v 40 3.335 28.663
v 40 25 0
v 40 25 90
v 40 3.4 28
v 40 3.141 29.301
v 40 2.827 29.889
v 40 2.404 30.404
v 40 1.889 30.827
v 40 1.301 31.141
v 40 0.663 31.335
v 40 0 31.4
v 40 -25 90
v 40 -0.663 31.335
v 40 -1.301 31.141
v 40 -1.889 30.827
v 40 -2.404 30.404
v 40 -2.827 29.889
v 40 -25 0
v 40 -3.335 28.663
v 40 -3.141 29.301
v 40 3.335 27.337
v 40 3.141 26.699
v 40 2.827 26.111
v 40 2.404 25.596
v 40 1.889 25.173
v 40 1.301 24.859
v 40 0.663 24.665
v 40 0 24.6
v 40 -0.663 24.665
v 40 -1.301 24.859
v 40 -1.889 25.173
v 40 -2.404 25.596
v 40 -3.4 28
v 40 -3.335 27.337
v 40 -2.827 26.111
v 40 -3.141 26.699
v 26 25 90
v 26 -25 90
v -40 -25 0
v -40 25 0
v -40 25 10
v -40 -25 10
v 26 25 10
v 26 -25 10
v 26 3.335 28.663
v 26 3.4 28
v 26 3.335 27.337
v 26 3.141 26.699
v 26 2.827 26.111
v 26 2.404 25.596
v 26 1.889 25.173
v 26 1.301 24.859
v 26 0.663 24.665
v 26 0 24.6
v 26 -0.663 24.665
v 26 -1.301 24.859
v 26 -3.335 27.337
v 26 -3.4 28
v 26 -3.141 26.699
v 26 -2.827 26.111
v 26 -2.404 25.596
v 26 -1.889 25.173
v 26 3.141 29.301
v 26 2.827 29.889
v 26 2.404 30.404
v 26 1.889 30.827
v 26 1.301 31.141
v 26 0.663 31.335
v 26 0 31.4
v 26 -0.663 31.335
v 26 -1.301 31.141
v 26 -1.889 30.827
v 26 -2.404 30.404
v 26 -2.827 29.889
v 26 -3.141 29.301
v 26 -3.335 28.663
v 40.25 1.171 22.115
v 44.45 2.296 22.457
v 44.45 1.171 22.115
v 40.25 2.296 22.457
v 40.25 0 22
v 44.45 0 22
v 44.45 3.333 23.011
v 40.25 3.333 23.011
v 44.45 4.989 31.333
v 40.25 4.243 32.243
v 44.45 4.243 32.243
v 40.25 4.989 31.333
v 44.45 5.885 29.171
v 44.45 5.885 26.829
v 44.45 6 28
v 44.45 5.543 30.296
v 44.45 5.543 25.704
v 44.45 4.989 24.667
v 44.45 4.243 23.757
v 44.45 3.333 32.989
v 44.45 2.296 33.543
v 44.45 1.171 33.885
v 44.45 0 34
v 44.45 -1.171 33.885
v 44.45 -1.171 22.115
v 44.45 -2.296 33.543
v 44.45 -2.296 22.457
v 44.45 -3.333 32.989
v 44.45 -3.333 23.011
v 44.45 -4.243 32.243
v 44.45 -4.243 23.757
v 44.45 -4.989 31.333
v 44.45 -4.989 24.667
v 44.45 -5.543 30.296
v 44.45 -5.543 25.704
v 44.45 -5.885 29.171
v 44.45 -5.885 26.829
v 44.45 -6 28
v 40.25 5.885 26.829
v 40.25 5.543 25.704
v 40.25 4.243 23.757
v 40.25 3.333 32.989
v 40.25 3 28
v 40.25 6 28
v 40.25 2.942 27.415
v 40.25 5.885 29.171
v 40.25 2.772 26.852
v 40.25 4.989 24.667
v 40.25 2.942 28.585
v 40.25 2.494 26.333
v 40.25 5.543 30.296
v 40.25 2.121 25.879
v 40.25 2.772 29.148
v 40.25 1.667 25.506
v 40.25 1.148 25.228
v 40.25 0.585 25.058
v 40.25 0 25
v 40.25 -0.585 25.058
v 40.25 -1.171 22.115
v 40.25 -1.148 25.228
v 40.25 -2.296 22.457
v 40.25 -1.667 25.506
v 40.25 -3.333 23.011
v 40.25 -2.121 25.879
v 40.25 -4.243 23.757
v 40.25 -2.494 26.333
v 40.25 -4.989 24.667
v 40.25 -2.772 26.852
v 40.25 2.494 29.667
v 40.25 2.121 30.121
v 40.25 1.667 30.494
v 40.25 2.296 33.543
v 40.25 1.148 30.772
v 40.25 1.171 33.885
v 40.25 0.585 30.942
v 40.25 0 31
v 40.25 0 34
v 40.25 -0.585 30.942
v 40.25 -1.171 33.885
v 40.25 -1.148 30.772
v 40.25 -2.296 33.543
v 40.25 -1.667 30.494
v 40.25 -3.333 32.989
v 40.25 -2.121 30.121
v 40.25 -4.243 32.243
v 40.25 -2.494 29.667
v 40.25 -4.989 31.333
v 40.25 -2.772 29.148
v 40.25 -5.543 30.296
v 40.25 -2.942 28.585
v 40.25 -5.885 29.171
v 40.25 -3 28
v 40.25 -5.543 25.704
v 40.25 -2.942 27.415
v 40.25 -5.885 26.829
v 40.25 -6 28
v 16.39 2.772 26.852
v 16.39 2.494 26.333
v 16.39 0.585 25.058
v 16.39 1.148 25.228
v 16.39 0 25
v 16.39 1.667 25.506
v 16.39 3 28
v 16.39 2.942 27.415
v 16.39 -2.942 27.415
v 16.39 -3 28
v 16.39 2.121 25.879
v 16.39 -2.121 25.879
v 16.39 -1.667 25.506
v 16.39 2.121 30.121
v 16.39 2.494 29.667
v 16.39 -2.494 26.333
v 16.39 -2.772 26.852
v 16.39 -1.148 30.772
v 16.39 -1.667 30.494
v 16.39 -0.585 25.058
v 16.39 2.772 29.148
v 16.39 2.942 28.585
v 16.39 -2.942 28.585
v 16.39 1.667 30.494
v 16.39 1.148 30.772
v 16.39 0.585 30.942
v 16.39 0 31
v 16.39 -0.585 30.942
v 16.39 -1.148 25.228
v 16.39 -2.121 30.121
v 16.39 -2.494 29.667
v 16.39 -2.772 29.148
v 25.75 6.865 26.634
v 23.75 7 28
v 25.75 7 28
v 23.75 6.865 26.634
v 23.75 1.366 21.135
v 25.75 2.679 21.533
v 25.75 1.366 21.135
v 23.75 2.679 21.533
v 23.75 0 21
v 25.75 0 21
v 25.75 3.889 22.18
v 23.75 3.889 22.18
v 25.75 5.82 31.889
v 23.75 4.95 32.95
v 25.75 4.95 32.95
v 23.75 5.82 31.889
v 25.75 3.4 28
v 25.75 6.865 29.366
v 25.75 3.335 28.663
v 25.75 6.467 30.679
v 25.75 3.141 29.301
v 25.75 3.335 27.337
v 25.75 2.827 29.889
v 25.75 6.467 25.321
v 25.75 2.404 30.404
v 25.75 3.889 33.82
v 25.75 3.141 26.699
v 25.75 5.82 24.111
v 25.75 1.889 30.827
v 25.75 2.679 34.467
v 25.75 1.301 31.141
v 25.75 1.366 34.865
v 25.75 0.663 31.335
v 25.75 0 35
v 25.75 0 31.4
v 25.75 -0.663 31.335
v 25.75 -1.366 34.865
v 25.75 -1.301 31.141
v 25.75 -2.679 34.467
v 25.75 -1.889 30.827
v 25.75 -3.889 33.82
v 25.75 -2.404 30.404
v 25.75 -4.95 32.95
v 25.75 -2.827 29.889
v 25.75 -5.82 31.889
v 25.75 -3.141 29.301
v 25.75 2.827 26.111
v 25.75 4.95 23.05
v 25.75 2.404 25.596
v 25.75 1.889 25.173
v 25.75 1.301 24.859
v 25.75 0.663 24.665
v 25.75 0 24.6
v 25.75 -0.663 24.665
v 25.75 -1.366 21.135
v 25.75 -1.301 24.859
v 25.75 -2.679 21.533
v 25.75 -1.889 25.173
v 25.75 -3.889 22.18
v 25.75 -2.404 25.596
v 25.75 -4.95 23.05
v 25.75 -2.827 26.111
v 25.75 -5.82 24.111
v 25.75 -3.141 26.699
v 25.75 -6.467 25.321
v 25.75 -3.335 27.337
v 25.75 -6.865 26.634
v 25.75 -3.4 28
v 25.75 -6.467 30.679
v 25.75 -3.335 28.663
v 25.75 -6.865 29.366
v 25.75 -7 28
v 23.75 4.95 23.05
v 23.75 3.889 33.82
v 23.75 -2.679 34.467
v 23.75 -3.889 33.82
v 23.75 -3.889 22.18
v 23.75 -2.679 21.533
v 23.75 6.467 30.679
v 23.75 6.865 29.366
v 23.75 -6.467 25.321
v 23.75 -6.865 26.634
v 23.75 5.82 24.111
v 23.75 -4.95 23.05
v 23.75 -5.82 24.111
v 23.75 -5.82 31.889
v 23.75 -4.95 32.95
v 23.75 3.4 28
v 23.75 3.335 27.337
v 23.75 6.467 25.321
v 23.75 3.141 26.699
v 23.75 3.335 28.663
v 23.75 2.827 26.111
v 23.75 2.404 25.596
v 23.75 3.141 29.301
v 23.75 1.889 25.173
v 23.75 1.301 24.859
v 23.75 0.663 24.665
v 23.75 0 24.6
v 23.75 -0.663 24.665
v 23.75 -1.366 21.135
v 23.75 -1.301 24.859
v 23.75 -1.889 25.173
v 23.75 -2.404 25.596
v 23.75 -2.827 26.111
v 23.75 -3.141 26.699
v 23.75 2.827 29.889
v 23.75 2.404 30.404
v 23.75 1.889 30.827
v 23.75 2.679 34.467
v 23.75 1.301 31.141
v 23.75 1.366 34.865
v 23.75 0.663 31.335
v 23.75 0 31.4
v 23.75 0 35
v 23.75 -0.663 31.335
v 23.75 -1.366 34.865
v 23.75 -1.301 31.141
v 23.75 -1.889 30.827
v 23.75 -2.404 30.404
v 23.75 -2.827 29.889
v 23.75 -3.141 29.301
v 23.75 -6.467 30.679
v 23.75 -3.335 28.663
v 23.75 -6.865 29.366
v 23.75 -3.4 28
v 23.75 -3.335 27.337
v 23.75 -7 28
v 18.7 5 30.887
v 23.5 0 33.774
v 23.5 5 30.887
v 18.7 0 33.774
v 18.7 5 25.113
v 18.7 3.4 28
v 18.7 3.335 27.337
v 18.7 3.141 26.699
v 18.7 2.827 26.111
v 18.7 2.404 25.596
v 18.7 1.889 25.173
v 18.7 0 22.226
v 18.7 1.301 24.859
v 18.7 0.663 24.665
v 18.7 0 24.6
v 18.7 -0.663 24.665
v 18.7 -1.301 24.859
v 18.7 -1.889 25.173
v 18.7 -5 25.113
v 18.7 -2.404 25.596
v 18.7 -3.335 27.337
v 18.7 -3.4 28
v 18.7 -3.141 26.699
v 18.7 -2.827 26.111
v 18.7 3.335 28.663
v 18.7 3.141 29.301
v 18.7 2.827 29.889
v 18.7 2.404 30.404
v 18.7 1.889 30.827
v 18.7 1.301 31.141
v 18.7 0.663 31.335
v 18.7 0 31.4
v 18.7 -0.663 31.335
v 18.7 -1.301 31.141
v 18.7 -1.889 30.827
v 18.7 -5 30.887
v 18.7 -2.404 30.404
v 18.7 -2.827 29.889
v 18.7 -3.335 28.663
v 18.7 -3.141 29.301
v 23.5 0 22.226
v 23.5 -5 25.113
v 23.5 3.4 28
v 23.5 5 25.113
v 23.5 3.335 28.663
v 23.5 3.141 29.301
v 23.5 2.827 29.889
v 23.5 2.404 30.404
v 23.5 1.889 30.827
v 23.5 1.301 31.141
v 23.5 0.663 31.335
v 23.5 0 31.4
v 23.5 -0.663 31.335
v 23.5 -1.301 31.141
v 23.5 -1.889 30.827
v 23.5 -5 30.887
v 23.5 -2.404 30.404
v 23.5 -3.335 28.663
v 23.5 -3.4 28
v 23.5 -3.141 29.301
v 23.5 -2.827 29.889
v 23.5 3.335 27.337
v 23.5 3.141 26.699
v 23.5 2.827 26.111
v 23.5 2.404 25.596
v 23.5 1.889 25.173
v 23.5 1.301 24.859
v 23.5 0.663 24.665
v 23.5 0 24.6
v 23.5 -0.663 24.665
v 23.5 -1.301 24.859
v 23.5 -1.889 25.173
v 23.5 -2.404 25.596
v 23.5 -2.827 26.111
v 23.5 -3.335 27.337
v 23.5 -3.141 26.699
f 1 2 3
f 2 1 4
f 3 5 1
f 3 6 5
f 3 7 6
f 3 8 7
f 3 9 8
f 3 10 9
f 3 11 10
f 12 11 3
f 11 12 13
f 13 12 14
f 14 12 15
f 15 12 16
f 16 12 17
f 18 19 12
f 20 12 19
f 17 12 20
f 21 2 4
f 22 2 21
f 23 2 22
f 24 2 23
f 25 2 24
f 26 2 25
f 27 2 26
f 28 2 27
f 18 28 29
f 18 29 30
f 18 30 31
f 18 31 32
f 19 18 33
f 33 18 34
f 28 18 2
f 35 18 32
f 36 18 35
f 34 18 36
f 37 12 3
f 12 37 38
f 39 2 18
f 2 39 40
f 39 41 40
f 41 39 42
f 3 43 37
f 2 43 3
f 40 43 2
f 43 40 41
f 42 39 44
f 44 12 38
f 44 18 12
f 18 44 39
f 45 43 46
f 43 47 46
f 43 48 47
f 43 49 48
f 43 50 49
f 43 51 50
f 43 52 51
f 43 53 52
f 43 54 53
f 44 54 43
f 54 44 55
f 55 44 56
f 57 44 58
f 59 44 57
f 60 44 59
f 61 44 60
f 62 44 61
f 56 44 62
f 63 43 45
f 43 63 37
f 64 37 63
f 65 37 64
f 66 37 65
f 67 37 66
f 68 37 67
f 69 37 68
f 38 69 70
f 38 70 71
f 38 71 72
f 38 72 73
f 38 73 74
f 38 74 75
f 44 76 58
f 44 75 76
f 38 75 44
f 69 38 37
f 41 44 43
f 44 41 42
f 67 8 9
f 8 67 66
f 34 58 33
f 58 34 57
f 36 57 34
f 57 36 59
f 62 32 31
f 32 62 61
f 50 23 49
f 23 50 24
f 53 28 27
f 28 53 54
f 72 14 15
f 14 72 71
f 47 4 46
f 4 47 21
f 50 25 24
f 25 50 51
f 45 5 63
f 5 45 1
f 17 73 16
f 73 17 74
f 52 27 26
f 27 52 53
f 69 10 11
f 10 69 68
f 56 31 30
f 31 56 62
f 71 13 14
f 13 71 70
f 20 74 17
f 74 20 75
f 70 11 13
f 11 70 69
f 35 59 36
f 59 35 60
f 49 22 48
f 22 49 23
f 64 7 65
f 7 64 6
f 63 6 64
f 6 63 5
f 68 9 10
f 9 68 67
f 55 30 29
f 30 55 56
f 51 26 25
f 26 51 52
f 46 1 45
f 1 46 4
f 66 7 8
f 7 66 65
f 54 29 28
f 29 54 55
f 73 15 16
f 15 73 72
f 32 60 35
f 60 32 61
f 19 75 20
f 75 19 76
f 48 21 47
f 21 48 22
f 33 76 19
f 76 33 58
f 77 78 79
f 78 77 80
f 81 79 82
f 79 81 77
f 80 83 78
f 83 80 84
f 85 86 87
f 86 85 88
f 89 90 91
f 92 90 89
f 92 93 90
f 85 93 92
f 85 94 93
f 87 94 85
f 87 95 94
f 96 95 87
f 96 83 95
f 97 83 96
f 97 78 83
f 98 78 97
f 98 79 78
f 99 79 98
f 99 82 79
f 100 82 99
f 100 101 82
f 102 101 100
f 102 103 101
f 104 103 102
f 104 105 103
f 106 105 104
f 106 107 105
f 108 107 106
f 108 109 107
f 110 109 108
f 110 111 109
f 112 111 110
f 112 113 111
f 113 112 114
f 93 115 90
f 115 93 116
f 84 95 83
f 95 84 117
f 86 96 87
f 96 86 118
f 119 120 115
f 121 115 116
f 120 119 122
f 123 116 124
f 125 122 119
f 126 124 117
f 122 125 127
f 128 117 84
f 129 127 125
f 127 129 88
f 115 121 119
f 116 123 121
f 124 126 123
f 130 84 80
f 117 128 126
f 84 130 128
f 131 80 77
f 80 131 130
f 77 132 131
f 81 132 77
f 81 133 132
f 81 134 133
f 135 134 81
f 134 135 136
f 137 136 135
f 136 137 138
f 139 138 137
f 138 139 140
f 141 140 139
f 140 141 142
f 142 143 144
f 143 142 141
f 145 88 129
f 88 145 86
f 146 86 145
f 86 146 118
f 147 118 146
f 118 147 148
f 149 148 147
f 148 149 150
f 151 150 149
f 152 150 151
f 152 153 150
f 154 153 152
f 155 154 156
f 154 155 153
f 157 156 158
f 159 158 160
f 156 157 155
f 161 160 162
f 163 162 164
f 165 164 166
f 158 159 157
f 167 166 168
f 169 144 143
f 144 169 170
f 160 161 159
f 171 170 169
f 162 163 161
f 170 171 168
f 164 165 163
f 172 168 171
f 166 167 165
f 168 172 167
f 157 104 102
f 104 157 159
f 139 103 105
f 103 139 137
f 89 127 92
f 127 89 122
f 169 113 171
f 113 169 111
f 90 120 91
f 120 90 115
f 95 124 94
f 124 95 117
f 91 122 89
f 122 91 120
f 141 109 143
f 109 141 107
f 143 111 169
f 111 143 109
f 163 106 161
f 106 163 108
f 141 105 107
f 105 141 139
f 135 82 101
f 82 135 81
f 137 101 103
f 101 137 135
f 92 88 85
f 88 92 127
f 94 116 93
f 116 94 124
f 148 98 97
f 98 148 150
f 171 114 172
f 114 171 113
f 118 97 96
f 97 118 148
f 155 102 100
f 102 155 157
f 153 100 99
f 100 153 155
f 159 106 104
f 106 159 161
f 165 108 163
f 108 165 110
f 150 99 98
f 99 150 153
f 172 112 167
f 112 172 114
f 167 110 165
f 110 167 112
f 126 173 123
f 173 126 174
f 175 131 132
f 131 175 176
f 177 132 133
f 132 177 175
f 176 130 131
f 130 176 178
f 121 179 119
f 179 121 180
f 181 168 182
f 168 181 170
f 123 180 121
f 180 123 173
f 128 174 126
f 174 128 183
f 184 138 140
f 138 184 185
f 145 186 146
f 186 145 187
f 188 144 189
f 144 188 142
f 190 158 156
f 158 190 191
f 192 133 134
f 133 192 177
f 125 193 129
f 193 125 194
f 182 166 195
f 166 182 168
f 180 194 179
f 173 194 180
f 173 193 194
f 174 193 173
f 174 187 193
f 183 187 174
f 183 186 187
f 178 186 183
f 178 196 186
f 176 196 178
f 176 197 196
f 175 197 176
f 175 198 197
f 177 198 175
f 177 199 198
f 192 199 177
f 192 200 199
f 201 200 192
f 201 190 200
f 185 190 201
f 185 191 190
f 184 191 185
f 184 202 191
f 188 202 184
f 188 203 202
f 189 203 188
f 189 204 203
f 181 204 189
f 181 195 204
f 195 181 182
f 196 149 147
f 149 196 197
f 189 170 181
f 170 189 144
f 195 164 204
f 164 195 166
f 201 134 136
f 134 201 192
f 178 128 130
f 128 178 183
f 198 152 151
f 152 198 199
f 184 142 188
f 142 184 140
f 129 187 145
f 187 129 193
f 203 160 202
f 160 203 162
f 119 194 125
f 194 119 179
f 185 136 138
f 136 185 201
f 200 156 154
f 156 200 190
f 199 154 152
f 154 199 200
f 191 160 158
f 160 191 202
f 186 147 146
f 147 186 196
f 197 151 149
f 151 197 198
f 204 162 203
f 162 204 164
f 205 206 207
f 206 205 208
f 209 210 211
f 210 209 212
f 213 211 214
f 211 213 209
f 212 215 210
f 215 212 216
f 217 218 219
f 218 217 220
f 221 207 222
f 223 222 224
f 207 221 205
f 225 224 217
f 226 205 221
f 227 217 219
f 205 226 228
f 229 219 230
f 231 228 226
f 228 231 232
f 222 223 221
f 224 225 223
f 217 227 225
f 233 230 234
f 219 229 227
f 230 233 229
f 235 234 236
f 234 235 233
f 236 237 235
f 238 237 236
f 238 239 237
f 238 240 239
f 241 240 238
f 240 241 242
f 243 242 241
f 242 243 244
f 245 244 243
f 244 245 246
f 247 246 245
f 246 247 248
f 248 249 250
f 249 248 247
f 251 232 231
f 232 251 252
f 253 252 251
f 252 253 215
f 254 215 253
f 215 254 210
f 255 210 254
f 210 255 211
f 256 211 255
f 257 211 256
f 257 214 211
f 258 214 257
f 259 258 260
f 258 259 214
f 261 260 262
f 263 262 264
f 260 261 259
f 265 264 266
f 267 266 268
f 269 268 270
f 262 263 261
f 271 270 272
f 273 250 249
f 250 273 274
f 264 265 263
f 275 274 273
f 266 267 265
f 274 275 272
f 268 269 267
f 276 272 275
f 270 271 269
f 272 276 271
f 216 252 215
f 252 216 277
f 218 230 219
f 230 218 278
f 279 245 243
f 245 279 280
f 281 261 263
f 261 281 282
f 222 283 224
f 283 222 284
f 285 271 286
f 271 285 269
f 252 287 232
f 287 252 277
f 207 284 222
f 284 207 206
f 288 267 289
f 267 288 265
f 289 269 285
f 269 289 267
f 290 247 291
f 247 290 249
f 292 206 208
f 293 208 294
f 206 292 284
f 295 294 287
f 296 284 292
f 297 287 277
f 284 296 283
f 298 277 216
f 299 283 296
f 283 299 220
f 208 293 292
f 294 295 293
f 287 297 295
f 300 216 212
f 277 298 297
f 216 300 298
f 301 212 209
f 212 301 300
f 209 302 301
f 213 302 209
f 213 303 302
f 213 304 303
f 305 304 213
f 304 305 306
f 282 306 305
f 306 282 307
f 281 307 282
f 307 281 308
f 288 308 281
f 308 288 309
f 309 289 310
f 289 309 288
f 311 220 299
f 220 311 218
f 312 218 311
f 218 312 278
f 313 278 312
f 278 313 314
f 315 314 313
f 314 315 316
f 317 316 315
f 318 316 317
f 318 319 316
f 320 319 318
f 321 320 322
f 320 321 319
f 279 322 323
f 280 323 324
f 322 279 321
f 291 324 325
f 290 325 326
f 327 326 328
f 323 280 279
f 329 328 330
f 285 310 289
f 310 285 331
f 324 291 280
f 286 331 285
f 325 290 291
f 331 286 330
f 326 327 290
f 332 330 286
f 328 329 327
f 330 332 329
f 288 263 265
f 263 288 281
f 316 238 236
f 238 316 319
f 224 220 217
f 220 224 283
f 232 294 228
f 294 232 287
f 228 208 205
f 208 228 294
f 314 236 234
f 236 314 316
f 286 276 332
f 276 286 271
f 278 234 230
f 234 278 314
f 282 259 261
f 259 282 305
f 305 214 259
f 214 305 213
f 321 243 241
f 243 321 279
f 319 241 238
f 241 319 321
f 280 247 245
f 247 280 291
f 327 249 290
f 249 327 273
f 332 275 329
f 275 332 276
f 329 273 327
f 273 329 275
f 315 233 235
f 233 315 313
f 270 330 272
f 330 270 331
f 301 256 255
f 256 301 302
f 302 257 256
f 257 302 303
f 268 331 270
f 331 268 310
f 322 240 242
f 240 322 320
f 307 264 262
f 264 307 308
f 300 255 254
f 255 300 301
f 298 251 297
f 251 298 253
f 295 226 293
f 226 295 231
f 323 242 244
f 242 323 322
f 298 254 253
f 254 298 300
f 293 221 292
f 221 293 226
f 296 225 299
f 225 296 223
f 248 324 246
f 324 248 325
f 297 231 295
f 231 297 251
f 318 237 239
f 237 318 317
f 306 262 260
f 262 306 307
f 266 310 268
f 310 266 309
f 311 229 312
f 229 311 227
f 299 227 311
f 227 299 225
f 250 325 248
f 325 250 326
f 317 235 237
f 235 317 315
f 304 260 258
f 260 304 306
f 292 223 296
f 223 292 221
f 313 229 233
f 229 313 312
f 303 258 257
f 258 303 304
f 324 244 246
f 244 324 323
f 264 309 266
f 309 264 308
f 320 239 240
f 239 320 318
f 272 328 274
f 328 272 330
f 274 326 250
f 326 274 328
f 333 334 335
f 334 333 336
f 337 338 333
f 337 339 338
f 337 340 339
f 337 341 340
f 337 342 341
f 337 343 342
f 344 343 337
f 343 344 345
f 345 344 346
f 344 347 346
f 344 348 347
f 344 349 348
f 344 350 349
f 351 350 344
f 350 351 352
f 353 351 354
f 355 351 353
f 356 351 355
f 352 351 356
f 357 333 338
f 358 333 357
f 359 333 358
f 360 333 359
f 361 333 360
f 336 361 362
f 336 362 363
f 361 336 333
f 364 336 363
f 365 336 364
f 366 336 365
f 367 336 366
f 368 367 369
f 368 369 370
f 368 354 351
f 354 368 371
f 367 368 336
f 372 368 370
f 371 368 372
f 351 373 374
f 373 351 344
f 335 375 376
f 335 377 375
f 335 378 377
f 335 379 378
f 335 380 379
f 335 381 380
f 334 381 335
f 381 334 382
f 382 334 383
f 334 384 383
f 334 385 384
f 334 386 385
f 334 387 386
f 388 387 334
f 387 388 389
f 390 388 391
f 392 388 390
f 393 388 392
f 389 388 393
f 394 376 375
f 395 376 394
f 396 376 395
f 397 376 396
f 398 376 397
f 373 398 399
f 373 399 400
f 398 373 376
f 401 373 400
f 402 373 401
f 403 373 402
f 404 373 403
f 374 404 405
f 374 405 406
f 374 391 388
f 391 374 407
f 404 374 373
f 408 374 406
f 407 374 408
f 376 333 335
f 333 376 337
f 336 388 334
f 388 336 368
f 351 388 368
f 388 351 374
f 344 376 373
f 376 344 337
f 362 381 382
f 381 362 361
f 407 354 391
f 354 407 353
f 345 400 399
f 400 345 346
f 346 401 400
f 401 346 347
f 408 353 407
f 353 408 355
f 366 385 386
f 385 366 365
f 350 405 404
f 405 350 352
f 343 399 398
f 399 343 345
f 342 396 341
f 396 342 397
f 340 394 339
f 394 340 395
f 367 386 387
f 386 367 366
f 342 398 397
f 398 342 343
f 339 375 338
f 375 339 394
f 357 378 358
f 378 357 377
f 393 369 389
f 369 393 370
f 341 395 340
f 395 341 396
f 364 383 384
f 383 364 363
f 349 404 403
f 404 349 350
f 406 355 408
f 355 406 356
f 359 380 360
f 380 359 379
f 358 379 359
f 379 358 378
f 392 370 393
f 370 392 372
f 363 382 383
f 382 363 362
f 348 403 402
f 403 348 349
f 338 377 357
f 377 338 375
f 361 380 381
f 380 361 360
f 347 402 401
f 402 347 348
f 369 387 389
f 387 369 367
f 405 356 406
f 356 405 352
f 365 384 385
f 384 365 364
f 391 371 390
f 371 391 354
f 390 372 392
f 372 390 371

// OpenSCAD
$fn = 32;

// ------------------------------------------------------------------------
// Bolted bracket: 80 x 50 mm bracket with 1 bolt joints
// Every part is its own module, assembly() places them once.
// ------------------------------------------------------------------------

// --- part 1 ---
module bracket() {
  difference() {
    translate([-40, -25, 0]) cube([80, 50, 90]);
    translate([-41, -26, 10]) cube([67, 52, 81]);
    translate([33, 0, 28]) rotate([0, 90, 0]) cylinder(h = 16, d = 6.8, center = true);
  }
}

// --- part 2 ---
module bolt() {
  cylinder(h = 4.2, d = 12);
  translate([0, 0, -23.86]) cylinder(h = 23.86, d = 6);
}

// --- part 3 ---
module washer() {
  difference() {
      translate([0, 0, 0]) cylinder(h = 2, d = 14);
      translate([0, 0, -1]) cylinder(h = 4, d = 6.8);
    }
}

// --- part 4 ---
module nut() {
  difference() {
    linear_extrude(height = 4.8) polygon(points = [[5.774, 0], [2.887, 5], [-2.887, 5], [-5.774, 0], [-2.887, -5], [2.887, -5]]);
    translate([0, 0, -1]) cylinder(h = 6.8, d = 6.8);
  }
}

// --- assembly ---
module assembly() {
  translate([0, 0, 0]) rotate([0, 0, 0]) bracket();
  translate([40.25, 0, 28]) rotate([0, 90, 0]) bolt();
  translate([23.75, 0, 28]) rotate([0, 90, 0]) washer();
  translate([18.7, 0, 28]) rotate([0, 90, 0]) nut();
}

assembly();
